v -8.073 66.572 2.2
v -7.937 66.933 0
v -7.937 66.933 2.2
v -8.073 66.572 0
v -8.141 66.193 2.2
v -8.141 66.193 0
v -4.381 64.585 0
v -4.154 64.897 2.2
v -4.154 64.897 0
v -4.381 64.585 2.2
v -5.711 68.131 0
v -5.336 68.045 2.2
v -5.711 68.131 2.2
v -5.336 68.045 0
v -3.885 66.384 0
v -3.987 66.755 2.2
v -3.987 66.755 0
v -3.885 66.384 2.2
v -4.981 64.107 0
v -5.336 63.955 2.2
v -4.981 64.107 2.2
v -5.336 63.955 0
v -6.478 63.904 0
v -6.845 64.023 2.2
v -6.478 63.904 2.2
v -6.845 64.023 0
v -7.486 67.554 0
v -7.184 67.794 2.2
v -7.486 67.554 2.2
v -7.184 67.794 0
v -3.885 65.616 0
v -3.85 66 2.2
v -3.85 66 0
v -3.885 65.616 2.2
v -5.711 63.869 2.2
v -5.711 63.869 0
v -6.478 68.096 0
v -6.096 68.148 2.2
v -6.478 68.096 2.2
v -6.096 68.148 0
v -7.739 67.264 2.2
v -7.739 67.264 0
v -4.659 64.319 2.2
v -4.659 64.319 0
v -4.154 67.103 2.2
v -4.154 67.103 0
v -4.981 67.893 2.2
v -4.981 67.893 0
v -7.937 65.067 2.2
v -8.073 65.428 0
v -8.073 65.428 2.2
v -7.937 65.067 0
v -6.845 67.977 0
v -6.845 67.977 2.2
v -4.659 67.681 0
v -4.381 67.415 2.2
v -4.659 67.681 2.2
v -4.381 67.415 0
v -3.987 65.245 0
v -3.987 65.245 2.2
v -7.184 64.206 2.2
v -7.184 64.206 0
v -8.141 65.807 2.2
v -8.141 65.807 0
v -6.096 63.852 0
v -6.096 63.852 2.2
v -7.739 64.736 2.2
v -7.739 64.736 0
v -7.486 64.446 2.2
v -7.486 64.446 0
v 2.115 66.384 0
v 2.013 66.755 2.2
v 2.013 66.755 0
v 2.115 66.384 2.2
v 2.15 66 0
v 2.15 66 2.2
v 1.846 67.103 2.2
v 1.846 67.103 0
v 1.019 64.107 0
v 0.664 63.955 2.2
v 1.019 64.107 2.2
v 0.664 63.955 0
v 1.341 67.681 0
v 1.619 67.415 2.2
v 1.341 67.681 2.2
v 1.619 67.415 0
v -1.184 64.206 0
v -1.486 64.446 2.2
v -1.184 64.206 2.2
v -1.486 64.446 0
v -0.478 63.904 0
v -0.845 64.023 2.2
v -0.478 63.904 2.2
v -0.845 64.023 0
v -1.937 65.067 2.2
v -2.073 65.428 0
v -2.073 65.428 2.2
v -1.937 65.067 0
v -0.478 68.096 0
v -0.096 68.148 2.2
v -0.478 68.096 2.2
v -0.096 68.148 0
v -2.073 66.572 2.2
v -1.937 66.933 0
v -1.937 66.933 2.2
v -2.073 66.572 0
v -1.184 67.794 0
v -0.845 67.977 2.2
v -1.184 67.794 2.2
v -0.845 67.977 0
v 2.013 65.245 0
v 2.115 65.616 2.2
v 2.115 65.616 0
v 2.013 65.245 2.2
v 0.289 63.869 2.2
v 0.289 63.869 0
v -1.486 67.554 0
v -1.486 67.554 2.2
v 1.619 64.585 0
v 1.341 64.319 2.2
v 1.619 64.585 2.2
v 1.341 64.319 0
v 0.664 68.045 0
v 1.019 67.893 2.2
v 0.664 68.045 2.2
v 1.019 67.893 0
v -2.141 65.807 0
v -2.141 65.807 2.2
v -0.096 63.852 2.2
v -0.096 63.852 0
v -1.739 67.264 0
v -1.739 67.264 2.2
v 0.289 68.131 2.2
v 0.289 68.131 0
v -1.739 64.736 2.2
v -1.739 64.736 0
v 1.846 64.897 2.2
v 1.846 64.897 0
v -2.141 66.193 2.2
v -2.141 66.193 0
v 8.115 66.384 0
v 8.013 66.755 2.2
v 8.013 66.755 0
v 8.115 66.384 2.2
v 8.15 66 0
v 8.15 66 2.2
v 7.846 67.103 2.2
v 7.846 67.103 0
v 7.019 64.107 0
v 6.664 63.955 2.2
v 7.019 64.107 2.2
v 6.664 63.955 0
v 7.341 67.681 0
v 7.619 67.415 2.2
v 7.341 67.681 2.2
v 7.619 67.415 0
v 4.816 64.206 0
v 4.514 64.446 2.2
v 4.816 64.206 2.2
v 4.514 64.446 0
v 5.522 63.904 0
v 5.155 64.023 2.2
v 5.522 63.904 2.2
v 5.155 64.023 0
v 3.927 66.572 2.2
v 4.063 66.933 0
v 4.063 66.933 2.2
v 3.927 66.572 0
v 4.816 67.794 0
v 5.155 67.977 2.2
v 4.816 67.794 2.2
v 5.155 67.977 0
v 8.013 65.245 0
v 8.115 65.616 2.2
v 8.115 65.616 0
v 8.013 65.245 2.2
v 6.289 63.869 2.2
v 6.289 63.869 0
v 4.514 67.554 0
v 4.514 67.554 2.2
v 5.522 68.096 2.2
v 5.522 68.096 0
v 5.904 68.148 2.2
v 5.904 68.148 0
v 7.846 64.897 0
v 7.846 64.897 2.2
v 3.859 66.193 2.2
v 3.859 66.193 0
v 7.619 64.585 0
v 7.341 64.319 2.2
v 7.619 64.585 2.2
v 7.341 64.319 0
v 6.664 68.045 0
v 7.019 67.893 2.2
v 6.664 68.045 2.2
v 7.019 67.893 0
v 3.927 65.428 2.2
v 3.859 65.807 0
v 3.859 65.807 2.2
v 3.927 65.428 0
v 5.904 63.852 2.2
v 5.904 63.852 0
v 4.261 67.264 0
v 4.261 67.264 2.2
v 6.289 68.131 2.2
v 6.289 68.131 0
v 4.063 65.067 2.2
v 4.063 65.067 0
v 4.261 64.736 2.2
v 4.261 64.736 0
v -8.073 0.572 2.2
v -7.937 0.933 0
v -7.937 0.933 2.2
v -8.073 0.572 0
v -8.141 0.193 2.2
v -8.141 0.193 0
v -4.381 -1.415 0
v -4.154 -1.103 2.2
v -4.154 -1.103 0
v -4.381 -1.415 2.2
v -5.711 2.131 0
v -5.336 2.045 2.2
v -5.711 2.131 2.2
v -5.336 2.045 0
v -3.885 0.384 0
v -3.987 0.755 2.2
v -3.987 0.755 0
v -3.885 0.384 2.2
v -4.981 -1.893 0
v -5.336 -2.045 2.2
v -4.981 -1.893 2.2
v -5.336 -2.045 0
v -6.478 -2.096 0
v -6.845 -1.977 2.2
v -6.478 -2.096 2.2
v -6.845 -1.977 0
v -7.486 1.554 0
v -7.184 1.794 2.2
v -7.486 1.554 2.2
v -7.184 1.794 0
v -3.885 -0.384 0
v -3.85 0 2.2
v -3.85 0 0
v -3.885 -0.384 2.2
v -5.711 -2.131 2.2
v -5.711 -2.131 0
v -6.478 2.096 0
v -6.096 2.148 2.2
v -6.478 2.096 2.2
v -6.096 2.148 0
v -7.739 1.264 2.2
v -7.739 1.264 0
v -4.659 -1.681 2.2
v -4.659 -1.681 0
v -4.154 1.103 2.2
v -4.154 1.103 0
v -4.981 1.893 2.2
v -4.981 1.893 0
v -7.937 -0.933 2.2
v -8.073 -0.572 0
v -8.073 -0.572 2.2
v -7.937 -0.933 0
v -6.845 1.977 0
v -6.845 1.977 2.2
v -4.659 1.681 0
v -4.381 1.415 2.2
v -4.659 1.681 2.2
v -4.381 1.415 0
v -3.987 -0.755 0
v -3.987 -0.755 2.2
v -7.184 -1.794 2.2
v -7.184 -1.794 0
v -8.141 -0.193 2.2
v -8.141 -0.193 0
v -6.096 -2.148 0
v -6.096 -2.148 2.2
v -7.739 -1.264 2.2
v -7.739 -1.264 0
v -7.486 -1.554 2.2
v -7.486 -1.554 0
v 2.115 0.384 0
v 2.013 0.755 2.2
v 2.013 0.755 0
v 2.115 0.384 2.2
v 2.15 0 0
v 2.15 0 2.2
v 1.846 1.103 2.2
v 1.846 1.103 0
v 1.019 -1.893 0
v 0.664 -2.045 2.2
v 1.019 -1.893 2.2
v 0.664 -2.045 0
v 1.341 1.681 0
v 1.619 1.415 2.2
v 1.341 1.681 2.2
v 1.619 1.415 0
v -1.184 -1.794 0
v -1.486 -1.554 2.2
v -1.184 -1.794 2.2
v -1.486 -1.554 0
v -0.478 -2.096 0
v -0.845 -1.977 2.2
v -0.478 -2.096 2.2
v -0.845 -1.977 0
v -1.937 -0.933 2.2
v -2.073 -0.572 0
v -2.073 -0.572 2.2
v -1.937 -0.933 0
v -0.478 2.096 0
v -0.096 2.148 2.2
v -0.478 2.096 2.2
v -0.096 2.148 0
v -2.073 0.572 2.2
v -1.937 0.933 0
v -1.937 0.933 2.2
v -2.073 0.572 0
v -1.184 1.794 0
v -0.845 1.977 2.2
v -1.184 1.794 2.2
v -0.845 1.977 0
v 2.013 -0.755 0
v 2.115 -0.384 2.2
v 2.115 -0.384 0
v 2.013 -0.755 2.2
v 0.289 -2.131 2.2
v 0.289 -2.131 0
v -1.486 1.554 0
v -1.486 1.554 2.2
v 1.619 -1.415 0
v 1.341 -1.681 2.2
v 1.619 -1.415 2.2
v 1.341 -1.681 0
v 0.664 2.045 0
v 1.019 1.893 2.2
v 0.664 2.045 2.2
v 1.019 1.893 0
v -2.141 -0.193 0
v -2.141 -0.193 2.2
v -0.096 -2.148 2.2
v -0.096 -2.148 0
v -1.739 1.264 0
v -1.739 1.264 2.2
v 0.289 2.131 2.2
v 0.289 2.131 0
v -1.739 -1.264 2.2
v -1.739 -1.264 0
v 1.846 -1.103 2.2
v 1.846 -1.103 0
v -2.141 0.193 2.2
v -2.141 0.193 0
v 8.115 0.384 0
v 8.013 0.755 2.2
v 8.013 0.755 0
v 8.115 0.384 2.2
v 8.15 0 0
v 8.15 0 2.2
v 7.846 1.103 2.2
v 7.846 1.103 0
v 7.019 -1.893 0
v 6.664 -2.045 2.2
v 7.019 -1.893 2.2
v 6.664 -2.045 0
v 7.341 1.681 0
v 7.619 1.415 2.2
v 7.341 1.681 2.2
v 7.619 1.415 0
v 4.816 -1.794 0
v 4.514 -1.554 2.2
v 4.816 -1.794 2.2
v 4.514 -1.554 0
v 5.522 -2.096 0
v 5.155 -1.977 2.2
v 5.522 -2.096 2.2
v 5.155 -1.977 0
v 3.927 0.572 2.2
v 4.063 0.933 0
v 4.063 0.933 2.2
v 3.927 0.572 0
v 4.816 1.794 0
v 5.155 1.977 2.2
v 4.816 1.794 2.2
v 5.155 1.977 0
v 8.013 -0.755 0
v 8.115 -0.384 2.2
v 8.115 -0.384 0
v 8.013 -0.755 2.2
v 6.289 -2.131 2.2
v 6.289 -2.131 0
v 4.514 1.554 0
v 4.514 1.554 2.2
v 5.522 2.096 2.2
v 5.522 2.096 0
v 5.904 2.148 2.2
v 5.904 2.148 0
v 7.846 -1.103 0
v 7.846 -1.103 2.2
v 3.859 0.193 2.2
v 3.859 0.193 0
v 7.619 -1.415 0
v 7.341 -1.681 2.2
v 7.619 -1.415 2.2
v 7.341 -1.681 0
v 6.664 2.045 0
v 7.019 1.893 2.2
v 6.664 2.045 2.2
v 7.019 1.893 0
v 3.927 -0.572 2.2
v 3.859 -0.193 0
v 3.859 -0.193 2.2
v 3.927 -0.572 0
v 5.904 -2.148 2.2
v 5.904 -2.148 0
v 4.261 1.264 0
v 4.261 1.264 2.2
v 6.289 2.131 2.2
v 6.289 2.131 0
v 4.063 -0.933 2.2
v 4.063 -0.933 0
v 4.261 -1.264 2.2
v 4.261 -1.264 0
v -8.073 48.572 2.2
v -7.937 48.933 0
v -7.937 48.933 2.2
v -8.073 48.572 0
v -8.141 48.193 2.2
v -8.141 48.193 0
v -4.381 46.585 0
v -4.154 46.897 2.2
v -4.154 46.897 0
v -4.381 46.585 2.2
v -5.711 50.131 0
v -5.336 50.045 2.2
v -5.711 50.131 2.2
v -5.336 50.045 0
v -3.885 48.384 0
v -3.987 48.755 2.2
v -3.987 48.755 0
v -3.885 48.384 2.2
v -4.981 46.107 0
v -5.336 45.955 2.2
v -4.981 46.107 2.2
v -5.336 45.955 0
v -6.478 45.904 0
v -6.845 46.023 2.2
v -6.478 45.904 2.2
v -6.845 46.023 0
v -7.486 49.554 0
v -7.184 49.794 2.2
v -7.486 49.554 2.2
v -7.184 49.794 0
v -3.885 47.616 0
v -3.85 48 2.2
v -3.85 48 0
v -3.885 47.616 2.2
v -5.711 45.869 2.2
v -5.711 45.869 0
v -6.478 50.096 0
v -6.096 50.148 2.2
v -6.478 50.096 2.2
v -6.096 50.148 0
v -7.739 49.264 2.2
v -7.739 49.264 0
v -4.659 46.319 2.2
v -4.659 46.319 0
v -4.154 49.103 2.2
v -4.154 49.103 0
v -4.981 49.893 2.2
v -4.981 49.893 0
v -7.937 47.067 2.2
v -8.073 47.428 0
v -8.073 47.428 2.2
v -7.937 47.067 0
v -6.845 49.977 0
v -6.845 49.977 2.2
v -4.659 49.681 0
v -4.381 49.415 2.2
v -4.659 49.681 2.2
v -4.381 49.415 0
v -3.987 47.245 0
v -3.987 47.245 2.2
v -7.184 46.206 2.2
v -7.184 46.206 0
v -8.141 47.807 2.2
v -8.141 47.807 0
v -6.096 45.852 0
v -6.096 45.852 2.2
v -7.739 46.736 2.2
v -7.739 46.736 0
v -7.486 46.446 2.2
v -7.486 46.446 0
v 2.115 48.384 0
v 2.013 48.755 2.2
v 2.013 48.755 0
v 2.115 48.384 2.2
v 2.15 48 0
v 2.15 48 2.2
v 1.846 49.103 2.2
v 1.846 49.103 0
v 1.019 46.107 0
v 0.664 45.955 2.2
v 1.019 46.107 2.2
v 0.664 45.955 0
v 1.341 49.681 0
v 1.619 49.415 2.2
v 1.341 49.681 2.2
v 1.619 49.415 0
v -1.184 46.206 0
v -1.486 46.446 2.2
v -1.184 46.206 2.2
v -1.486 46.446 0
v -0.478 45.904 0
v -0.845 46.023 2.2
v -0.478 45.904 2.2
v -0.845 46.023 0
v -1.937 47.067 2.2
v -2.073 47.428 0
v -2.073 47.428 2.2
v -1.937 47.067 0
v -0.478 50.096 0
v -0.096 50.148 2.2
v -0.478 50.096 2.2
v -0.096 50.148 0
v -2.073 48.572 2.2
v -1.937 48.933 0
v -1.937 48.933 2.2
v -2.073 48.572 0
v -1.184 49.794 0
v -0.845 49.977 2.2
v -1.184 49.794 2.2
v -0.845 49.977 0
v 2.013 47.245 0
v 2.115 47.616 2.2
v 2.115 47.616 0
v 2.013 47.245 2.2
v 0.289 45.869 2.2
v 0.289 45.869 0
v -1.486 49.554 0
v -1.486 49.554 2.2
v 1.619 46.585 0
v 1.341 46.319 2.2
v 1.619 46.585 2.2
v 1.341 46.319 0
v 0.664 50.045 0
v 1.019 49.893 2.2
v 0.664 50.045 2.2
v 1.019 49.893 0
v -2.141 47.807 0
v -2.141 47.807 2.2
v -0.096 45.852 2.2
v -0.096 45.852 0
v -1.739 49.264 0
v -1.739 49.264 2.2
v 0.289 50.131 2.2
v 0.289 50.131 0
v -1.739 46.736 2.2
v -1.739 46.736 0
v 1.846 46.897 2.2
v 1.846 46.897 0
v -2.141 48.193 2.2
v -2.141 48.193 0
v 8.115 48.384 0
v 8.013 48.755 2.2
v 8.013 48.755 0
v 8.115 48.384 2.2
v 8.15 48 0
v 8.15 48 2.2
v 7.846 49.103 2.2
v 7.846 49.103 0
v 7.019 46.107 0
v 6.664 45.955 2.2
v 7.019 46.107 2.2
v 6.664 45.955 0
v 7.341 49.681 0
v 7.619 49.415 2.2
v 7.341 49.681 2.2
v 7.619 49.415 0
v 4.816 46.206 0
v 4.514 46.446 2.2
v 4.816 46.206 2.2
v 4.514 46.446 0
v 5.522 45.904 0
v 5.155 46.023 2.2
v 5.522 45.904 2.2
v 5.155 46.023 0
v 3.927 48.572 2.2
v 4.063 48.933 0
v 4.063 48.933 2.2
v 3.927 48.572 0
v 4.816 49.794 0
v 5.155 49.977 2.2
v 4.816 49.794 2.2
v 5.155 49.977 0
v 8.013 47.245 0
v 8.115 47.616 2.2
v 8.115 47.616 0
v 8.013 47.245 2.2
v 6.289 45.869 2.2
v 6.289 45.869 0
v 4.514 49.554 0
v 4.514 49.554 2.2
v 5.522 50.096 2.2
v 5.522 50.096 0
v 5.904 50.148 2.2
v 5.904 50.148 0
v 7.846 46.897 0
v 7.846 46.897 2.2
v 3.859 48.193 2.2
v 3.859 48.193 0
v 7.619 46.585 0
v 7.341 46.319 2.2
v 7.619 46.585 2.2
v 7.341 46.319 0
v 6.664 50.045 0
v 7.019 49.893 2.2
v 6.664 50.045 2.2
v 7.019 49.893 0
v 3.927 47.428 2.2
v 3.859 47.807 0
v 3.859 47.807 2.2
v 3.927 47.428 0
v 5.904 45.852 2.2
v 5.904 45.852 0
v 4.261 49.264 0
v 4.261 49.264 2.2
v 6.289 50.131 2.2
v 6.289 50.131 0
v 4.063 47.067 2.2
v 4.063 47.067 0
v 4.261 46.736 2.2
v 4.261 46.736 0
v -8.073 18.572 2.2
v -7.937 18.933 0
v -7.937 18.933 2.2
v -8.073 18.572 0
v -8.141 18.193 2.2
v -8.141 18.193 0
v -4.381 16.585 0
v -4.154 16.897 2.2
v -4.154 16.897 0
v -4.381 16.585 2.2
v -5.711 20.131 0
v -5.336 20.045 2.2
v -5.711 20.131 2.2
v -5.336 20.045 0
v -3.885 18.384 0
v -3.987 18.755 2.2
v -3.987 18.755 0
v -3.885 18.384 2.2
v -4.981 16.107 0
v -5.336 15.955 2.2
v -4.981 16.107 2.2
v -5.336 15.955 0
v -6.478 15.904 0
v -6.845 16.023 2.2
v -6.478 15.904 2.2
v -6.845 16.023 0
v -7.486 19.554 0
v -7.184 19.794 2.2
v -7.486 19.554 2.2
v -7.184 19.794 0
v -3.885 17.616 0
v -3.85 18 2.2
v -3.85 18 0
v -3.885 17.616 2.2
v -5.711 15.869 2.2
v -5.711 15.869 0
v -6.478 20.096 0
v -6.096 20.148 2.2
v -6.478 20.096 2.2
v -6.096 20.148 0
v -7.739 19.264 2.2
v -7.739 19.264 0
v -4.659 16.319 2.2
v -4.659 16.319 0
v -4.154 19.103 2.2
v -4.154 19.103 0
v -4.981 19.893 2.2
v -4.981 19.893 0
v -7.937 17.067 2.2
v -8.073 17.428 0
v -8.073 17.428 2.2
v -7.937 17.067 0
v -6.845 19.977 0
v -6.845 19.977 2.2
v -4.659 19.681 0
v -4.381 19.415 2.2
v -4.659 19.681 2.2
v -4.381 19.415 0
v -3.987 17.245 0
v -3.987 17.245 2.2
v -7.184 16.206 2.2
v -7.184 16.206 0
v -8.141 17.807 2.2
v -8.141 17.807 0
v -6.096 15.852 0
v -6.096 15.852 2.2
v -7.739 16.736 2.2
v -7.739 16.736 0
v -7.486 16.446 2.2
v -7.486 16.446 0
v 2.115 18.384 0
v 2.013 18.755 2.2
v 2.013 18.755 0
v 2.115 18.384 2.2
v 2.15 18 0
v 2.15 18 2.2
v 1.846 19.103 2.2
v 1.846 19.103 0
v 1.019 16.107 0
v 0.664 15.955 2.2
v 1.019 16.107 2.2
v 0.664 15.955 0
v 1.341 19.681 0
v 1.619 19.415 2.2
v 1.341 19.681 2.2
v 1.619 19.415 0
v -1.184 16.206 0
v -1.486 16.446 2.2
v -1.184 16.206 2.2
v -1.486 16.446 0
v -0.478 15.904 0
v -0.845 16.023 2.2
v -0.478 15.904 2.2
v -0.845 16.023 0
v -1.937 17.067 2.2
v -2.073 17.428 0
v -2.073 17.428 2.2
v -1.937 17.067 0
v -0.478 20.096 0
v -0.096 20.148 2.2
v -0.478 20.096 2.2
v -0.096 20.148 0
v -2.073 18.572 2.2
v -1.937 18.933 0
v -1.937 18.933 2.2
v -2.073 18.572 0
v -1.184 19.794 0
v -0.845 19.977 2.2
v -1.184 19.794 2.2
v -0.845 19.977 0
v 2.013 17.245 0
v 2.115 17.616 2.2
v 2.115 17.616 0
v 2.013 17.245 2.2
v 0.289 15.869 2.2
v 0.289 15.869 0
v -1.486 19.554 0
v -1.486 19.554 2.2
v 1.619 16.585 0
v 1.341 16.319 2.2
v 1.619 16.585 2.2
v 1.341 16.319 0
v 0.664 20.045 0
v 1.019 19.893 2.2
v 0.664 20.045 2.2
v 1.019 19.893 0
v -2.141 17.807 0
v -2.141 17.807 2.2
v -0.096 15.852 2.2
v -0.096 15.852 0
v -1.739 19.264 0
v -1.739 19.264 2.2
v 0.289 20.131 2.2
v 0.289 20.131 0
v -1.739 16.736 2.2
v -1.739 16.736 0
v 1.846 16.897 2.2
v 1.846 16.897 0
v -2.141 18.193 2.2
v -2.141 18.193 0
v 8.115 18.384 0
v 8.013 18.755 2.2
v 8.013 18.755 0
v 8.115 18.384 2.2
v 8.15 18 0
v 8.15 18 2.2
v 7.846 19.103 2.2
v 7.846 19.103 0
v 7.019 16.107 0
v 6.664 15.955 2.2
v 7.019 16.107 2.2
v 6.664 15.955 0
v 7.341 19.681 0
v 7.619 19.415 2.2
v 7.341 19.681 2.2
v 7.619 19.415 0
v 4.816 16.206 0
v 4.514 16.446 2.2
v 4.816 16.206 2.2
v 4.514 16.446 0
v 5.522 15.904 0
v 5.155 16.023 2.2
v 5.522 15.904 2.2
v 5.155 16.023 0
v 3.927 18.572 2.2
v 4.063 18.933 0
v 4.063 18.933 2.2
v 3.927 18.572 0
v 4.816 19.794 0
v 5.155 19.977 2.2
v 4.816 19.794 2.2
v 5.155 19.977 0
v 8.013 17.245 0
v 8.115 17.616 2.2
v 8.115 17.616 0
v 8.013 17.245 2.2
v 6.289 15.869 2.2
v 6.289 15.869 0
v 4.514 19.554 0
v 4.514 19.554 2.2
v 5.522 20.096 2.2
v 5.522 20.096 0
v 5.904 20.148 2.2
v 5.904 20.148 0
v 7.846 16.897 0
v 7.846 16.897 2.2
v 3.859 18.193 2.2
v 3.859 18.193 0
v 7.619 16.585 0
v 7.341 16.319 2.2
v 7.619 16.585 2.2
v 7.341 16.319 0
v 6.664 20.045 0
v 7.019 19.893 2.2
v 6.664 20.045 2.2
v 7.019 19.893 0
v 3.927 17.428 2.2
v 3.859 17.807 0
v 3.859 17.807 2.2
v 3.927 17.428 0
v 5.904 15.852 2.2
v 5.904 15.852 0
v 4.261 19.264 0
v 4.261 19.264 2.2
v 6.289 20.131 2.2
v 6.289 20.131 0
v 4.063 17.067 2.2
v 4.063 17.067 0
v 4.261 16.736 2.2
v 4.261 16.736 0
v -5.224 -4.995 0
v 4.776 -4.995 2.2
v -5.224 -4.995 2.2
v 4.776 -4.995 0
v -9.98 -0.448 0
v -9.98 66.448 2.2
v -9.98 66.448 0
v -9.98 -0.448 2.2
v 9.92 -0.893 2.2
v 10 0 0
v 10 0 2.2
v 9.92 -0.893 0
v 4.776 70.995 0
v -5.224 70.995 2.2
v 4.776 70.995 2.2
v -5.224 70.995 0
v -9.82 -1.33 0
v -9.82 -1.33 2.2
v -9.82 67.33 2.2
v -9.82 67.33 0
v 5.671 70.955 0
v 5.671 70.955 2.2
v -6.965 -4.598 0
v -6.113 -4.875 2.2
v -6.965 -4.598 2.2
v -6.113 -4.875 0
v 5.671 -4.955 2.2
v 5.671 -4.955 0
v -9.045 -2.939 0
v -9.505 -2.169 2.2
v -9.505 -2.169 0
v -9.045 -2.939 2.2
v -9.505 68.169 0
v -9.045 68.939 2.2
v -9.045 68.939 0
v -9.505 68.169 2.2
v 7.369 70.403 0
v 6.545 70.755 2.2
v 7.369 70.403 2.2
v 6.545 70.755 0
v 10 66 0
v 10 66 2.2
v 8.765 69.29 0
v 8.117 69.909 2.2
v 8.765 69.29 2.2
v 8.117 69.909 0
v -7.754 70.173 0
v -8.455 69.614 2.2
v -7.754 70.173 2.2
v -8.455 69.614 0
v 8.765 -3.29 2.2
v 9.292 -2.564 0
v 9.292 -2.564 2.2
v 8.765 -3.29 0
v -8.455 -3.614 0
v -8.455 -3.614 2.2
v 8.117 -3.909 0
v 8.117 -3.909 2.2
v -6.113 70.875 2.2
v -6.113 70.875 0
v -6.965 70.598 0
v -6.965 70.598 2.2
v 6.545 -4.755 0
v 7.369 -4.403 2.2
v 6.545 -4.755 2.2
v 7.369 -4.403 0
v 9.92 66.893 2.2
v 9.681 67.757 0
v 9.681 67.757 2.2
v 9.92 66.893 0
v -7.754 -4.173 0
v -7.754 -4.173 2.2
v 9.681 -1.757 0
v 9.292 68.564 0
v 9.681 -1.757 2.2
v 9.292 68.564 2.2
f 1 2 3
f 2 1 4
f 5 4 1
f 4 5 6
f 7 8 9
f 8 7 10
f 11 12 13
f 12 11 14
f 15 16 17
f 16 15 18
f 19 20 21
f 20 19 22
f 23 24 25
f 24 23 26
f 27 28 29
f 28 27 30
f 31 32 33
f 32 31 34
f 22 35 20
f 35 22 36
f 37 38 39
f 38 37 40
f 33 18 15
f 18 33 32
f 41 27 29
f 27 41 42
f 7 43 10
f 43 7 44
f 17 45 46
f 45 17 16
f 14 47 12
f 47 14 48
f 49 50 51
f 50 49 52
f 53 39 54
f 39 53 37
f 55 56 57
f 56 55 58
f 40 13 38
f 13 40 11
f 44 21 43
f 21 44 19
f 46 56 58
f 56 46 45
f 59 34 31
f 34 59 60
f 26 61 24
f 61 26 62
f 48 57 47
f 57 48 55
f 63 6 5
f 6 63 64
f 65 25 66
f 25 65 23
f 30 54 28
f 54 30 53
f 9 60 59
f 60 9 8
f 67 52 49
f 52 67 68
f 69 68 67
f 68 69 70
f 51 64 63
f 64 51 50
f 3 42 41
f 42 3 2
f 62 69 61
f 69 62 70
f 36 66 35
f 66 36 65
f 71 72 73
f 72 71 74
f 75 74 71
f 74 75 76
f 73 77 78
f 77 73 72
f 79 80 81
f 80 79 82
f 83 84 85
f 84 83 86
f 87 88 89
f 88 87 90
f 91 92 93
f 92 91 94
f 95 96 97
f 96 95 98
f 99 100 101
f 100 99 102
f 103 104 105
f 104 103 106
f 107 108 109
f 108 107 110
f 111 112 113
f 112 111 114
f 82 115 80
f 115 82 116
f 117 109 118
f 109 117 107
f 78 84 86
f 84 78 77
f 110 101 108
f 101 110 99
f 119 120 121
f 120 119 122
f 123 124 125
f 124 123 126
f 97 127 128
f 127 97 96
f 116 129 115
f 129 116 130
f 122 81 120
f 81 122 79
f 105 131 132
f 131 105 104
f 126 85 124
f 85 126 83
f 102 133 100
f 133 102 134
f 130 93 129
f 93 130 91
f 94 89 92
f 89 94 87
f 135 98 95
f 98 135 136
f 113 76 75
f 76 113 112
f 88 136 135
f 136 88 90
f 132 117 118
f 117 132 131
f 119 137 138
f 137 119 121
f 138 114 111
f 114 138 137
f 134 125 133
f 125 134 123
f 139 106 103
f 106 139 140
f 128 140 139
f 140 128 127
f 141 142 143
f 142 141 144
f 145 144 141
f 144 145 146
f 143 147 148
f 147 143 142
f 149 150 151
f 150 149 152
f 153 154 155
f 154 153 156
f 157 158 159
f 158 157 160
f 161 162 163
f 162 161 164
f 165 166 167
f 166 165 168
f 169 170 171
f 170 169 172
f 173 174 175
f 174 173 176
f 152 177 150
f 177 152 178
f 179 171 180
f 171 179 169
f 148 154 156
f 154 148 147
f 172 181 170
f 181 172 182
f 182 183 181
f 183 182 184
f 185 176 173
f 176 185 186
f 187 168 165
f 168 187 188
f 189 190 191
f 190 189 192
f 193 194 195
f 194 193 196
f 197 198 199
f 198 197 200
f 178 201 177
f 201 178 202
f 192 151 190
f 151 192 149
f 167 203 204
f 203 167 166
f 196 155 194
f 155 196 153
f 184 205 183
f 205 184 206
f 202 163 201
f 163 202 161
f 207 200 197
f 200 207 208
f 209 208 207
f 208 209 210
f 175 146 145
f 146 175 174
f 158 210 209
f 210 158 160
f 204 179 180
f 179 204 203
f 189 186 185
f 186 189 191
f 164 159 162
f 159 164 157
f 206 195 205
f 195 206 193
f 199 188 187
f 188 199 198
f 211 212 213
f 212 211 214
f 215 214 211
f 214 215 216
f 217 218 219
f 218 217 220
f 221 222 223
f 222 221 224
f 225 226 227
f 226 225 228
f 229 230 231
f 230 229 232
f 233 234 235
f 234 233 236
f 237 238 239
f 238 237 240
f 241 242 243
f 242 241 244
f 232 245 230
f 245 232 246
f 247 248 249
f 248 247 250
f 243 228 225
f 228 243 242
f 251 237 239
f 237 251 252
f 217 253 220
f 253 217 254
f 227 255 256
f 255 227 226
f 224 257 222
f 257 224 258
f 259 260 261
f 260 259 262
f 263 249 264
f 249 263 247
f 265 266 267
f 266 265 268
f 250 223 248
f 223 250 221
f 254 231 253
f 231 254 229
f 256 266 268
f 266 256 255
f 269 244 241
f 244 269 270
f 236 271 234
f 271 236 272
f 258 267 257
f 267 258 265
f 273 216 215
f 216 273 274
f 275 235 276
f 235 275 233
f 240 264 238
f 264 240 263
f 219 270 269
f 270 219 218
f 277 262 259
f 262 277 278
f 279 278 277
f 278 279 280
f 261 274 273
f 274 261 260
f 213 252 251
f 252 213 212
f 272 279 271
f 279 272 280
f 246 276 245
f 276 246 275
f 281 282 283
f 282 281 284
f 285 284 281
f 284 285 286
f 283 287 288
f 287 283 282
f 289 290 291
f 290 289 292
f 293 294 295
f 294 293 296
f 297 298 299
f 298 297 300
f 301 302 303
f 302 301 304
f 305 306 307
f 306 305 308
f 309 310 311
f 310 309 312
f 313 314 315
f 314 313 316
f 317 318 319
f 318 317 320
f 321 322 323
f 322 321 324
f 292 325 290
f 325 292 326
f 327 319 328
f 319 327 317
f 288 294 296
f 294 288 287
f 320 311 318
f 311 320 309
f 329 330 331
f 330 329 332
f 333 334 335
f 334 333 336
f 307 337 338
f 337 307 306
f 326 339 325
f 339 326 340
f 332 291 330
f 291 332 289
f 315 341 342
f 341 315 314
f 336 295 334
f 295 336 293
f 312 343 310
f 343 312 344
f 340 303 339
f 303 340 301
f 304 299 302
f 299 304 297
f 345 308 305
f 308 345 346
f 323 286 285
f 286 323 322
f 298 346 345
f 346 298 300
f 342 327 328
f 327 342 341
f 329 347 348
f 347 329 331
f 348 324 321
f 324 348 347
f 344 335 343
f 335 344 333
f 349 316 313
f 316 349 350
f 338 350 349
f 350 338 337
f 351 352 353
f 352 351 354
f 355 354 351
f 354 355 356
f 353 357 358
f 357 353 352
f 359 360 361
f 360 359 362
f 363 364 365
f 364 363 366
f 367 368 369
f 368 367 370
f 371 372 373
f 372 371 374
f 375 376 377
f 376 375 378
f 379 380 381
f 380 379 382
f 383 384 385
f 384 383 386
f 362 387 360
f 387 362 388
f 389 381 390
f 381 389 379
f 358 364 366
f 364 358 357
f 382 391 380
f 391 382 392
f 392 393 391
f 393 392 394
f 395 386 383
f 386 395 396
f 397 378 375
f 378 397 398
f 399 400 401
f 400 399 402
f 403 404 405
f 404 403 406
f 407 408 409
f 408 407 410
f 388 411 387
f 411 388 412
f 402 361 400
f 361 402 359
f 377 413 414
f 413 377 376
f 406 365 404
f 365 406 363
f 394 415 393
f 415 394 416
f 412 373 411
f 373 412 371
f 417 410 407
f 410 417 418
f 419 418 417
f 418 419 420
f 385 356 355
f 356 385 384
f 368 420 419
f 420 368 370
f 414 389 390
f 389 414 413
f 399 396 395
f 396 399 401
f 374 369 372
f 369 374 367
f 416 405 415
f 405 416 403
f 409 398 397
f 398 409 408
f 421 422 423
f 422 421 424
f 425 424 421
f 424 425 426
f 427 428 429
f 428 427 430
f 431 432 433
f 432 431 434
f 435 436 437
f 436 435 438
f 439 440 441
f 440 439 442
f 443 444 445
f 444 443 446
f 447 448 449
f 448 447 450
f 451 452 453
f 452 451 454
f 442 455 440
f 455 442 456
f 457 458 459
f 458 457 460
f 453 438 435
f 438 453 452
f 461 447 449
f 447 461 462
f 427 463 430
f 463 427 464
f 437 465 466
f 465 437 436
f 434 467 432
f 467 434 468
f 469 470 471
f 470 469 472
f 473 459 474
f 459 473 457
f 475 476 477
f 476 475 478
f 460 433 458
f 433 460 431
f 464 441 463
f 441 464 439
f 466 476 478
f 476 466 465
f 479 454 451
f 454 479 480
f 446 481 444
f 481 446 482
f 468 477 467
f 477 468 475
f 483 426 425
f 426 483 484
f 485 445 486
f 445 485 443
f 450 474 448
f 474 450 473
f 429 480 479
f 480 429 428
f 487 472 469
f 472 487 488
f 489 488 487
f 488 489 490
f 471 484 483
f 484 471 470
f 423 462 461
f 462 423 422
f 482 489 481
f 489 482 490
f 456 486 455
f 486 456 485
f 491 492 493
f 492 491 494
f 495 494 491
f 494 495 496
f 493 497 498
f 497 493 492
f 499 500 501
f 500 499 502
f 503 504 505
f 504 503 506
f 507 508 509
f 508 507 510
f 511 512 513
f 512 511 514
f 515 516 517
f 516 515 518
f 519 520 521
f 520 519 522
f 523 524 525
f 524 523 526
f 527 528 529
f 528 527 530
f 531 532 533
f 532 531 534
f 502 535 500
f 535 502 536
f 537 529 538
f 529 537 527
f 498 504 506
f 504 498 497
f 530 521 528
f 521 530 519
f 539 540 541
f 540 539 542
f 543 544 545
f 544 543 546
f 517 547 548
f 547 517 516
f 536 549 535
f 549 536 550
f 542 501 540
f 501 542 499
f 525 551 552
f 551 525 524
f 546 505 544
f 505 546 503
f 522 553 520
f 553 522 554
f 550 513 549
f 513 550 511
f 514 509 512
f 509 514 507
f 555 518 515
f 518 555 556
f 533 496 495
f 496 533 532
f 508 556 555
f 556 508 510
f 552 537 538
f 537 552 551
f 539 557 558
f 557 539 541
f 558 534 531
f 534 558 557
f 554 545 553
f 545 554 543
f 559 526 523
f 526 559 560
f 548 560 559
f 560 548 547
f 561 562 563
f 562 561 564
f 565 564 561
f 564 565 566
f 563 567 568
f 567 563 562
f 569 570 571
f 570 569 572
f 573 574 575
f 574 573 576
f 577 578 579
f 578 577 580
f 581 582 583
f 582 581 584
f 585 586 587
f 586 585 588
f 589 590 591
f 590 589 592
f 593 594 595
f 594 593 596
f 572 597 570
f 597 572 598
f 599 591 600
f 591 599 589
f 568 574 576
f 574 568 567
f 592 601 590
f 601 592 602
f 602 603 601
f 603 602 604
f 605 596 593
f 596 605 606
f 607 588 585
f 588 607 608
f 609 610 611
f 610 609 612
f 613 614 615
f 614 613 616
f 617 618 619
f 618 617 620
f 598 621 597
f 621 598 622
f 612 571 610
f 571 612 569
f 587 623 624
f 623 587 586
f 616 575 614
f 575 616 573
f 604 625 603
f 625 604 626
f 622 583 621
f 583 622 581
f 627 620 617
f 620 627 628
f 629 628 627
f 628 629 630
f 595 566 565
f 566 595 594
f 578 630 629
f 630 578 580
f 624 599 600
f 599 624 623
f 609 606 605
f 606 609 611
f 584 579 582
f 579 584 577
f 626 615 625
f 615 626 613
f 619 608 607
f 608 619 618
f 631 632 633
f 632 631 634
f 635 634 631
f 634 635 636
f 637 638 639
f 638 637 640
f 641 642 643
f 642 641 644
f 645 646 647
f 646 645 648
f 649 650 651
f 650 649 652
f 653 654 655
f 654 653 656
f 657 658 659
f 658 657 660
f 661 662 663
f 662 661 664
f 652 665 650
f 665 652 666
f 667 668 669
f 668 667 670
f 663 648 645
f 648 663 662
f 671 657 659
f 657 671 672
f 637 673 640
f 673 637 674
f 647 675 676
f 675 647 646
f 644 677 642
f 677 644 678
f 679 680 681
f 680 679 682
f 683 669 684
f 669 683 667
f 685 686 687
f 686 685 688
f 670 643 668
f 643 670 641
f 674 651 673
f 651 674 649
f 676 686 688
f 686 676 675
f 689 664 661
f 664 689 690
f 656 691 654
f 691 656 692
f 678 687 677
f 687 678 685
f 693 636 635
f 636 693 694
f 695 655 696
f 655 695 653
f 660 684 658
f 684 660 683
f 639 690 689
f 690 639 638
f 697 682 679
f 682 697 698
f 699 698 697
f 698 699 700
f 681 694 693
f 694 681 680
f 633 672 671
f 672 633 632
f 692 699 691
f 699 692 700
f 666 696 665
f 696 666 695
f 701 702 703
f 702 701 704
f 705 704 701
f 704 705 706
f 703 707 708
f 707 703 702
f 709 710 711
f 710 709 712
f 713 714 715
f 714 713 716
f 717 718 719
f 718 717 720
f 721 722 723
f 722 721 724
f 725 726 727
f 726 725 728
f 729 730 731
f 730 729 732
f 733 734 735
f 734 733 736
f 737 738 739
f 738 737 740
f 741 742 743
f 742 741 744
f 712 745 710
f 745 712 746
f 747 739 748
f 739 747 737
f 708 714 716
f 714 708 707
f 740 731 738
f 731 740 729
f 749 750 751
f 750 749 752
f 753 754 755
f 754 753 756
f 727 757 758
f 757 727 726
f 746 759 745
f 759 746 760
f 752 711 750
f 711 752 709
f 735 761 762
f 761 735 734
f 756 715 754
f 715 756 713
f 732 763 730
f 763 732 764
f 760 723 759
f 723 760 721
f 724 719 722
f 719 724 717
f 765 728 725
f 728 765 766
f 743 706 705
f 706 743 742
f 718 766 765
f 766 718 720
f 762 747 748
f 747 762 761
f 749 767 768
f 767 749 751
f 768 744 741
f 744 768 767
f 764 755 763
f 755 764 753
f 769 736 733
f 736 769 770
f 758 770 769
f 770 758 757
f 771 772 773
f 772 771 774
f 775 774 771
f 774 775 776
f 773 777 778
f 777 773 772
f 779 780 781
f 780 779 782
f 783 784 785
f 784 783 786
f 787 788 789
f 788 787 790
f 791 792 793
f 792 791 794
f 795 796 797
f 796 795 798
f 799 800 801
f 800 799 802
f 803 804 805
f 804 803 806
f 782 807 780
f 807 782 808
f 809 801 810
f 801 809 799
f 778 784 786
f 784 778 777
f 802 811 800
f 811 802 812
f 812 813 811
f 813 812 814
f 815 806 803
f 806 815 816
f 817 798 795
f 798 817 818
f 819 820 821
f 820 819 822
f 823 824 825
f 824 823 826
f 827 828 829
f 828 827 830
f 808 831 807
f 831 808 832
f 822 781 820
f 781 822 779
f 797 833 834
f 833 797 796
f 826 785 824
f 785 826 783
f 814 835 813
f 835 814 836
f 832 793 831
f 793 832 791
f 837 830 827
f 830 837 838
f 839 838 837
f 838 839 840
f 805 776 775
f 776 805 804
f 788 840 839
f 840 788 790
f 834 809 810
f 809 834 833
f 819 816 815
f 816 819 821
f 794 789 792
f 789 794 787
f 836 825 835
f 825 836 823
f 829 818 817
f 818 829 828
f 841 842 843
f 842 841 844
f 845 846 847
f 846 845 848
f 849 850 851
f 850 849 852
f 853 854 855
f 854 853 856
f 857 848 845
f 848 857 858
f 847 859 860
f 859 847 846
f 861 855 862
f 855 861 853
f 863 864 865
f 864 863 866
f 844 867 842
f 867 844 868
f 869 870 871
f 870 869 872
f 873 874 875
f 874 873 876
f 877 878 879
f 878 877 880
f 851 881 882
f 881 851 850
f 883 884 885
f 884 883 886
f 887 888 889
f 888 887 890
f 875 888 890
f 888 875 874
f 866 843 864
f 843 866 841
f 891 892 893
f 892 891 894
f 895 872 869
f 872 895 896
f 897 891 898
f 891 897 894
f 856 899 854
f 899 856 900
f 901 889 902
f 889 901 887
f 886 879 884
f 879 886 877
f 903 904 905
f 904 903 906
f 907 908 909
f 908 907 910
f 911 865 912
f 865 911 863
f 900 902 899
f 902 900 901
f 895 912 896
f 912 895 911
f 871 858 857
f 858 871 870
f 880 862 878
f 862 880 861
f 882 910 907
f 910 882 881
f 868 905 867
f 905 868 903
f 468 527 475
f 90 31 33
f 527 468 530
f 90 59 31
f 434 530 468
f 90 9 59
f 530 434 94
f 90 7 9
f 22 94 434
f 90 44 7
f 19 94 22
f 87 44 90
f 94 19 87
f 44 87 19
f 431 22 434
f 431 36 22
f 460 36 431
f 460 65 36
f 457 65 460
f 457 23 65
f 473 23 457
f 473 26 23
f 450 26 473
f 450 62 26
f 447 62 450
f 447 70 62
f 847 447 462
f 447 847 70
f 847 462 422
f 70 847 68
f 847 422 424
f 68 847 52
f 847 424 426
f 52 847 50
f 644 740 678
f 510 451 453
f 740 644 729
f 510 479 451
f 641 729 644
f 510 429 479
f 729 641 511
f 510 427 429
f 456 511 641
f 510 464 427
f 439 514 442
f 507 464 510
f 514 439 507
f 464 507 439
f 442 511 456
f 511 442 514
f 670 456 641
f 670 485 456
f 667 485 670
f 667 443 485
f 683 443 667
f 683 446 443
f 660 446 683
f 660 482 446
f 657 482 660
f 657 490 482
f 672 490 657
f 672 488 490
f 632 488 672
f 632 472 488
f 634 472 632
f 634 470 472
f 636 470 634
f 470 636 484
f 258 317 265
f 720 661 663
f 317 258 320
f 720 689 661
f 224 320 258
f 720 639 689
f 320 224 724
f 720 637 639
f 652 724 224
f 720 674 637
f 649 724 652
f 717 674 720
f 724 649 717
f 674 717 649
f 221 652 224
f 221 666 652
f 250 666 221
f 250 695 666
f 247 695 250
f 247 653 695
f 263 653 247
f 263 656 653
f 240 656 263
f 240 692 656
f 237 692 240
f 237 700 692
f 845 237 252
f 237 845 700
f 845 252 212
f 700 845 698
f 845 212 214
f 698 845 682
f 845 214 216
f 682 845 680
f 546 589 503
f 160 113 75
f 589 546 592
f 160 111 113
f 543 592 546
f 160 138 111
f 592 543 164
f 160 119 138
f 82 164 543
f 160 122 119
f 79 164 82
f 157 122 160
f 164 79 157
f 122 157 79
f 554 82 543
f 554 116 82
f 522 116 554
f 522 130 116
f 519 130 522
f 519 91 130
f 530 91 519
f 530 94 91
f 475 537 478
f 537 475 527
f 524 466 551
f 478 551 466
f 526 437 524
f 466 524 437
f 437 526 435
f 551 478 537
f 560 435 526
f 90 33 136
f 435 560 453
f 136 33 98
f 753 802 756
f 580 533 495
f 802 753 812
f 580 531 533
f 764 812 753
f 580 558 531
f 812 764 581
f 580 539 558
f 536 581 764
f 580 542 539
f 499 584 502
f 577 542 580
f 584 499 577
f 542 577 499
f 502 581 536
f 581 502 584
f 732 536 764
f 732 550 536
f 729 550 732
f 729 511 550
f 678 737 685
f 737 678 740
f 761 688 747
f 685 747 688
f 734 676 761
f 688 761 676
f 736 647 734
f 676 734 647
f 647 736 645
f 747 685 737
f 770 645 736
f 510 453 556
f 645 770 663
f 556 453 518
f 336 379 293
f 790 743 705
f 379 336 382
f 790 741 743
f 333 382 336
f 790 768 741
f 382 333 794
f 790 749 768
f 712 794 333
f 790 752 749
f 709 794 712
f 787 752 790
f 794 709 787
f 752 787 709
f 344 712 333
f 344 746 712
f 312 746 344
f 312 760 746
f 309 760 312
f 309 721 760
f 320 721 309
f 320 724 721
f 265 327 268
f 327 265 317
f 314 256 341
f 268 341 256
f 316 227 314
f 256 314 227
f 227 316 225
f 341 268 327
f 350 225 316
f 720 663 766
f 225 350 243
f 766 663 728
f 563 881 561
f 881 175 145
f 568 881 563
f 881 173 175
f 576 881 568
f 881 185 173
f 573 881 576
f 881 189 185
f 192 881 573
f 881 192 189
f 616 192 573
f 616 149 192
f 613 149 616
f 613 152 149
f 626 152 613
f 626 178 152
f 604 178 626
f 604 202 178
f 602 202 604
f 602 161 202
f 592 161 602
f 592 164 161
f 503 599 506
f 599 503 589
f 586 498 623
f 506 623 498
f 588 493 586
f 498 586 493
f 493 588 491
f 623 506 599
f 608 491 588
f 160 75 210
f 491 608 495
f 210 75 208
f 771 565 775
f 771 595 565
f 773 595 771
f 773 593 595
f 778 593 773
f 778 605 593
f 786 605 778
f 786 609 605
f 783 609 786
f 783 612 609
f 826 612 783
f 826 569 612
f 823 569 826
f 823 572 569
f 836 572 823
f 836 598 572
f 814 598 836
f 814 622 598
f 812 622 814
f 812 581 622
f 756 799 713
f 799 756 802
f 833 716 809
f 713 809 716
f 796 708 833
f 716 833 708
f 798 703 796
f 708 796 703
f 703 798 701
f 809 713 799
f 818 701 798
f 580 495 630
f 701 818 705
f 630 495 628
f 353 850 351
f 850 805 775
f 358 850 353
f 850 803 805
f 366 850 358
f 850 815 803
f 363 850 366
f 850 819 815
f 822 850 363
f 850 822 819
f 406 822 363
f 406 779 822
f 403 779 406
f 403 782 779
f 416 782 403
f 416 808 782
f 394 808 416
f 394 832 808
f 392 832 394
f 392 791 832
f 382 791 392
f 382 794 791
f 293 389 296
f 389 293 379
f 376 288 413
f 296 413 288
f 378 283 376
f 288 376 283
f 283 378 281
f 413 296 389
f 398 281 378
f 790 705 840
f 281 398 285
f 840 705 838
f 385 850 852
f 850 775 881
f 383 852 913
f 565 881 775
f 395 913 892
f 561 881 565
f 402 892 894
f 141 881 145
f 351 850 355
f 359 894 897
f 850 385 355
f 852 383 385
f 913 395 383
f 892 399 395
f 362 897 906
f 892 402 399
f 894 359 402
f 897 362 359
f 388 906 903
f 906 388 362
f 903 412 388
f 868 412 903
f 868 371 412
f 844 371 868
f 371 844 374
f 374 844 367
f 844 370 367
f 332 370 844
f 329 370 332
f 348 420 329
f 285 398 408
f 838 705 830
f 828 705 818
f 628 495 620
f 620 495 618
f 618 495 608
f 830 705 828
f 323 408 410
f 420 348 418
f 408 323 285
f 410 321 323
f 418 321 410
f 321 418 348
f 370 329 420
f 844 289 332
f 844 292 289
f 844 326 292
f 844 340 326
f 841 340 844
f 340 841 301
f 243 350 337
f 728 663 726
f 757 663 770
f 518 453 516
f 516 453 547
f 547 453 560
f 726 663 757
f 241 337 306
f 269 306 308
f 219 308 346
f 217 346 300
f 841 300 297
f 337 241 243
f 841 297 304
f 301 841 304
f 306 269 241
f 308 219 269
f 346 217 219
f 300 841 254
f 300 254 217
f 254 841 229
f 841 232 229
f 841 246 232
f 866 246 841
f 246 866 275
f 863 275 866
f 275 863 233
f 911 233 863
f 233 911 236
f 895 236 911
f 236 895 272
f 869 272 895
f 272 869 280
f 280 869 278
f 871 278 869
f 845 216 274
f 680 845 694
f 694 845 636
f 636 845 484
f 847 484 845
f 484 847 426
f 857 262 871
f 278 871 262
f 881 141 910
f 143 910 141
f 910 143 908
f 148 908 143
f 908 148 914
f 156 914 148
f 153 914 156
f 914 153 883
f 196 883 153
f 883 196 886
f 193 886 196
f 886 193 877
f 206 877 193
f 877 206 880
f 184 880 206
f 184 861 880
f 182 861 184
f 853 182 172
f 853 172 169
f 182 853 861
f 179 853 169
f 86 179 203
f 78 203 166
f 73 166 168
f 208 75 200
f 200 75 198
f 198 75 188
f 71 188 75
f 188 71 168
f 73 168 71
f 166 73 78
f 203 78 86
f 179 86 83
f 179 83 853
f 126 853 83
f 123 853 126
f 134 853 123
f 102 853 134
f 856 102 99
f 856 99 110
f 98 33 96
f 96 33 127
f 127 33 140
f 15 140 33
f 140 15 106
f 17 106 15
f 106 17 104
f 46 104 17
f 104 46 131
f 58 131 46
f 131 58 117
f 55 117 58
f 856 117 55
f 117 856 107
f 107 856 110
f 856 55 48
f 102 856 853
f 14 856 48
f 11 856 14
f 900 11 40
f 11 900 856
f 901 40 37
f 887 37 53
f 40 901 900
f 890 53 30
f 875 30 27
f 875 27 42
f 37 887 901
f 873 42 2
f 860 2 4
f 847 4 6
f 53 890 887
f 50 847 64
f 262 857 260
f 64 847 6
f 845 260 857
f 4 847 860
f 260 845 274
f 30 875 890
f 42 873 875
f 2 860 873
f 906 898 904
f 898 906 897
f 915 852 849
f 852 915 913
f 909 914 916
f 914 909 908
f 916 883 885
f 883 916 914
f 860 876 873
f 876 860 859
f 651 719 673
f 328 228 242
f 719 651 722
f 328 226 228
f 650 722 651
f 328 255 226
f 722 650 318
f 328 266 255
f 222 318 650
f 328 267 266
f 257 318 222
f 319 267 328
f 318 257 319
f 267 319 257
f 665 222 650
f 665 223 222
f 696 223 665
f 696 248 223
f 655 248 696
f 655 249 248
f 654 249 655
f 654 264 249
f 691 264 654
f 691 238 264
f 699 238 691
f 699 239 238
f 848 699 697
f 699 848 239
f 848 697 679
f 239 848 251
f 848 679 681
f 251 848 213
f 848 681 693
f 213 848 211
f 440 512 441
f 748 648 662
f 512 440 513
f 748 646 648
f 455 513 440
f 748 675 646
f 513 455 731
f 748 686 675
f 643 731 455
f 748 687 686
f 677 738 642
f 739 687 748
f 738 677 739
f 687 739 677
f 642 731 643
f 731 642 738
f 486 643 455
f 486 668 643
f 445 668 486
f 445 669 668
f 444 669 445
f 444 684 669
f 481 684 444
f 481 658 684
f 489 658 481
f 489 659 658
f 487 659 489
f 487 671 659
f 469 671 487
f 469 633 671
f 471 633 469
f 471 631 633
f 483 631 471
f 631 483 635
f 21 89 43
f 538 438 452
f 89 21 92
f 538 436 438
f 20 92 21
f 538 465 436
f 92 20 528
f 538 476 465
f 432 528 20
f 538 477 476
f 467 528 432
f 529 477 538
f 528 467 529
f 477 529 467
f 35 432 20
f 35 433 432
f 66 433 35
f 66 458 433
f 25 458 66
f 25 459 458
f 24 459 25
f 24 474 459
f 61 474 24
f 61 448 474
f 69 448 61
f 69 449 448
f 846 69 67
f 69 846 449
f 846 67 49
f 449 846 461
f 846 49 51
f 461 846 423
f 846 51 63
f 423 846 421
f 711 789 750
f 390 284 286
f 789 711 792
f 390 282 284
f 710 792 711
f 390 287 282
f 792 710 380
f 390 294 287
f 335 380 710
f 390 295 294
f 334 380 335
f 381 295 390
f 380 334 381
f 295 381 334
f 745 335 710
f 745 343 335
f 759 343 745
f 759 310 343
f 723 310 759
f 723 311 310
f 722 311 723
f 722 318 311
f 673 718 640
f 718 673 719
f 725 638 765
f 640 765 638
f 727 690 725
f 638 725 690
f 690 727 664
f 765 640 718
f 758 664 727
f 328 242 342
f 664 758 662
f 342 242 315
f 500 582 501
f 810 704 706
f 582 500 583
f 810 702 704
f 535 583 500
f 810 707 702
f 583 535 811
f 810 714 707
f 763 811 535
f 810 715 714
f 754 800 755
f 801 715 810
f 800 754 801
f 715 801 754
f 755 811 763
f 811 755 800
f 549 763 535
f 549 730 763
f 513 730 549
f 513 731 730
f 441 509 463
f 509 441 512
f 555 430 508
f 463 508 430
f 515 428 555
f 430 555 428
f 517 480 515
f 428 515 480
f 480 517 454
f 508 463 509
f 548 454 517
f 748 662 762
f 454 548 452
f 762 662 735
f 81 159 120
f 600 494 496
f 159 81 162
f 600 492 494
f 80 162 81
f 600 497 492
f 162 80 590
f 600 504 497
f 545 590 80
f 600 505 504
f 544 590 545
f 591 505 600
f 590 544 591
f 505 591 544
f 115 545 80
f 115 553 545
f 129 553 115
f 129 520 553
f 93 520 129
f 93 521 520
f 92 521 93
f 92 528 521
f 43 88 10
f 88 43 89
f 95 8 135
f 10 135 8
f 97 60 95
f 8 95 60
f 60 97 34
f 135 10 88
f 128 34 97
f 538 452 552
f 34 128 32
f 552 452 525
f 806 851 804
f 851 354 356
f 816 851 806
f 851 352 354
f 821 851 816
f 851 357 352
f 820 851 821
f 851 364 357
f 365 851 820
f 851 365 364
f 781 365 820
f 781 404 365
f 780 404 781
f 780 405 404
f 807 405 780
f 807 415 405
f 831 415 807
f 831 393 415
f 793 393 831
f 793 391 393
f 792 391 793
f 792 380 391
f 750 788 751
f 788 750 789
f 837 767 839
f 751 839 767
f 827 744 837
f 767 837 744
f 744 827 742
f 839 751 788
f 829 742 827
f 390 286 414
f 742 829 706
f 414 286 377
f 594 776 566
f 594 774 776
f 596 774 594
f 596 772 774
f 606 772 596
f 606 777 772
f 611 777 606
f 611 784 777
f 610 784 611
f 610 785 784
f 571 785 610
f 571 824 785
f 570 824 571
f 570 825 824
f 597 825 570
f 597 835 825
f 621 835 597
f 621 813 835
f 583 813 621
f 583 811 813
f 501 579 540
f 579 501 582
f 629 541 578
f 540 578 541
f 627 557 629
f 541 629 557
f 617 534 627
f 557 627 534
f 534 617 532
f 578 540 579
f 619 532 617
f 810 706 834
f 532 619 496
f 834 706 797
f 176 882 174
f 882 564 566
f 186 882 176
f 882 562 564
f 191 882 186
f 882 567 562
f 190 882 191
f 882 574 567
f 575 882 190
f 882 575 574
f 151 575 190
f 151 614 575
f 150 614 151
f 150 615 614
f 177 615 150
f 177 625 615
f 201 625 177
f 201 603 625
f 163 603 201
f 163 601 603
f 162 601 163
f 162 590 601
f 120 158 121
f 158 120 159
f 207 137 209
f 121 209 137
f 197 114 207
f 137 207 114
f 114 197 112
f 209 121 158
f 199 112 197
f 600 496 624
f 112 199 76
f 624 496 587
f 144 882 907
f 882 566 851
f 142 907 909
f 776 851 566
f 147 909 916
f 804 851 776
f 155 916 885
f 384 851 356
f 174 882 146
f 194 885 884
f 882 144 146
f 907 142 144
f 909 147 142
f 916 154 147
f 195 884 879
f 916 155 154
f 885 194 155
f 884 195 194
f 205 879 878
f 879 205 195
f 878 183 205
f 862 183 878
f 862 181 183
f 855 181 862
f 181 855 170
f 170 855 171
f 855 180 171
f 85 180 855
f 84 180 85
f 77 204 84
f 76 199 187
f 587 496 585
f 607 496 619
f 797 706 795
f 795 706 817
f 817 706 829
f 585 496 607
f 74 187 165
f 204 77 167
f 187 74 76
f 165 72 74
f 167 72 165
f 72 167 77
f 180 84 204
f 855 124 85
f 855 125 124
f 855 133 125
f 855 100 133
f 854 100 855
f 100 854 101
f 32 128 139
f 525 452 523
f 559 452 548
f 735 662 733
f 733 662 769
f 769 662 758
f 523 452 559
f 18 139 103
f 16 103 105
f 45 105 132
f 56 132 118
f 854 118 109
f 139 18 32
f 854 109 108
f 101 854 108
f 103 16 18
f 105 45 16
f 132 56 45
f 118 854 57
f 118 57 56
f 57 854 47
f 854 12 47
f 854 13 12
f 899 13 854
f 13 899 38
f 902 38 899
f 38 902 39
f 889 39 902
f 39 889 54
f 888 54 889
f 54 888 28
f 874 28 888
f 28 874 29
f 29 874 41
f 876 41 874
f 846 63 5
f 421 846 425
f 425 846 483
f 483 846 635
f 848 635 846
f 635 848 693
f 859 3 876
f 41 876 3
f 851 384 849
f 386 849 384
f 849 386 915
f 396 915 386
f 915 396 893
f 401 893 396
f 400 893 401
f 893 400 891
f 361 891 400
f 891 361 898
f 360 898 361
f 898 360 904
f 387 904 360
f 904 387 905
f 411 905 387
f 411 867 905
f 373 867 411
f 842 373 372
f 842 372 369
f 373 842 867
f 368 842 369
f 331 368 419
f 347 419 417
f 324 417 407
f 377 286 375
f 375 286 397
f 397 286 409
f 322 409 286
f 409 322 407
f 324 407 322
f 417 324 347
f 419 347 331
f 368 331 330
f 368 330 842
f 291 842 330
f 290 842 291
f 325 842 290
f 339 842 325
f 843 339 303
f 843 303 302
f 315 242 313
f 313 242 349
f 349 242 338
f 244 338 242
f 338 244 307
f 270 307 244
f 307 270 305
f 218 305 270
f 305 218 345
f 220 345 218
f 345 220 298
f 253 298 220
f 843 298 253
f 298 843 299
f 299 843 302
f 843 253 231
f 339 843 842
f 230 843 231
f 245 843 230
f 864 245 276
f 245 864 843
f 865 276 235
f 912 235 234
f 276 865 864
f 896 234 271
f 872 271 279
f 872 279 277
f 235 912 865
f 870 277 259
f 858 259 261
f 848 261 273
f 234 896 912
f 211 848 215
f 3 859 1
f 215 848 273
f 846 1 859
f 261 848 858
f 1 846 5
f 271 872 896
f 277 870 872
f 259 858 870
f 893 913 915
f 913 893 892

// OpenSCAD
// file: common.scad
// Width of plastic
Width = 2.2;

// Color of the parts
PartsColor = [0.8, 0.8, 0.8];

// Diameter of plastic ollo holes
OlloHoles = 4.3;

// Width of Ollo "real" plastic
OlloWidth = 3;

// Motor dimensions
MotorWidth = 24;
MotorHeight = 36;
MotorDepth = 24;
MotorArmOffset = 9;

// U dimensions
UHeight = 10;
URadius = 8;
UWidth = 30+Width/2;
UTotalHeight = UHeight+URadius;

// Side dimensions
SideSize = 38 + 0;
SideHolesToBorder = 5;

// Size of the body
BodySize = 18;

// Defining the resolution
$fn=35;

// Do an Ollo hole on the part
module olloHole(depth=Width)
{
    translate([0,0,-0.1])
      cylinder(depth+0.2, OlloHoles/2, OlloHoles/2);
}

// Do 3 ollo holes
module threeOllo(depth=Width)
{
  for (xy=[[-6,0],[0,0],[6,0]]) {
    translate([xy[0], xy[1], 0])
    olloHole(depth);
  }
}

// Do a servo arm holes
module servoArm(depth=Width)
{
    threeOllo(depth);
    rotate([0,0,90])
      threeOllo(depth);
}

// Do a rounded cube
module rounded(x=10, y=10, z=10, r=3, center=false) {
  if (center) {
    translate([-(x/2),-(y/2),0])
      rounded(x, y, z, r);
  } else {
    translate([r,r,0])
    minkowski() {
      cube([x-2*r,y-2*r,z/2]);
      cylinder(h=z/2, r=r);
    }
  }
}
// main file
include <common.scad>;

module side() {
    translate([0,SideSize-SideHolesToBorder,0]) {
        color(PartsColor) {
            difference() {
                rounded(20, SideSize*2, Width, 5, true);
                for (y=[SideSize-SideHolesToBorder,	 -SideSize+SideHolesToBorder,
                        SideSize-SideHolesToBorder-18, -SideSize+SideHolesToBorder+18]) {
                    translate([0, y, 0])
                        threeOllo();
                }
            }
        }
    }
}

side();
